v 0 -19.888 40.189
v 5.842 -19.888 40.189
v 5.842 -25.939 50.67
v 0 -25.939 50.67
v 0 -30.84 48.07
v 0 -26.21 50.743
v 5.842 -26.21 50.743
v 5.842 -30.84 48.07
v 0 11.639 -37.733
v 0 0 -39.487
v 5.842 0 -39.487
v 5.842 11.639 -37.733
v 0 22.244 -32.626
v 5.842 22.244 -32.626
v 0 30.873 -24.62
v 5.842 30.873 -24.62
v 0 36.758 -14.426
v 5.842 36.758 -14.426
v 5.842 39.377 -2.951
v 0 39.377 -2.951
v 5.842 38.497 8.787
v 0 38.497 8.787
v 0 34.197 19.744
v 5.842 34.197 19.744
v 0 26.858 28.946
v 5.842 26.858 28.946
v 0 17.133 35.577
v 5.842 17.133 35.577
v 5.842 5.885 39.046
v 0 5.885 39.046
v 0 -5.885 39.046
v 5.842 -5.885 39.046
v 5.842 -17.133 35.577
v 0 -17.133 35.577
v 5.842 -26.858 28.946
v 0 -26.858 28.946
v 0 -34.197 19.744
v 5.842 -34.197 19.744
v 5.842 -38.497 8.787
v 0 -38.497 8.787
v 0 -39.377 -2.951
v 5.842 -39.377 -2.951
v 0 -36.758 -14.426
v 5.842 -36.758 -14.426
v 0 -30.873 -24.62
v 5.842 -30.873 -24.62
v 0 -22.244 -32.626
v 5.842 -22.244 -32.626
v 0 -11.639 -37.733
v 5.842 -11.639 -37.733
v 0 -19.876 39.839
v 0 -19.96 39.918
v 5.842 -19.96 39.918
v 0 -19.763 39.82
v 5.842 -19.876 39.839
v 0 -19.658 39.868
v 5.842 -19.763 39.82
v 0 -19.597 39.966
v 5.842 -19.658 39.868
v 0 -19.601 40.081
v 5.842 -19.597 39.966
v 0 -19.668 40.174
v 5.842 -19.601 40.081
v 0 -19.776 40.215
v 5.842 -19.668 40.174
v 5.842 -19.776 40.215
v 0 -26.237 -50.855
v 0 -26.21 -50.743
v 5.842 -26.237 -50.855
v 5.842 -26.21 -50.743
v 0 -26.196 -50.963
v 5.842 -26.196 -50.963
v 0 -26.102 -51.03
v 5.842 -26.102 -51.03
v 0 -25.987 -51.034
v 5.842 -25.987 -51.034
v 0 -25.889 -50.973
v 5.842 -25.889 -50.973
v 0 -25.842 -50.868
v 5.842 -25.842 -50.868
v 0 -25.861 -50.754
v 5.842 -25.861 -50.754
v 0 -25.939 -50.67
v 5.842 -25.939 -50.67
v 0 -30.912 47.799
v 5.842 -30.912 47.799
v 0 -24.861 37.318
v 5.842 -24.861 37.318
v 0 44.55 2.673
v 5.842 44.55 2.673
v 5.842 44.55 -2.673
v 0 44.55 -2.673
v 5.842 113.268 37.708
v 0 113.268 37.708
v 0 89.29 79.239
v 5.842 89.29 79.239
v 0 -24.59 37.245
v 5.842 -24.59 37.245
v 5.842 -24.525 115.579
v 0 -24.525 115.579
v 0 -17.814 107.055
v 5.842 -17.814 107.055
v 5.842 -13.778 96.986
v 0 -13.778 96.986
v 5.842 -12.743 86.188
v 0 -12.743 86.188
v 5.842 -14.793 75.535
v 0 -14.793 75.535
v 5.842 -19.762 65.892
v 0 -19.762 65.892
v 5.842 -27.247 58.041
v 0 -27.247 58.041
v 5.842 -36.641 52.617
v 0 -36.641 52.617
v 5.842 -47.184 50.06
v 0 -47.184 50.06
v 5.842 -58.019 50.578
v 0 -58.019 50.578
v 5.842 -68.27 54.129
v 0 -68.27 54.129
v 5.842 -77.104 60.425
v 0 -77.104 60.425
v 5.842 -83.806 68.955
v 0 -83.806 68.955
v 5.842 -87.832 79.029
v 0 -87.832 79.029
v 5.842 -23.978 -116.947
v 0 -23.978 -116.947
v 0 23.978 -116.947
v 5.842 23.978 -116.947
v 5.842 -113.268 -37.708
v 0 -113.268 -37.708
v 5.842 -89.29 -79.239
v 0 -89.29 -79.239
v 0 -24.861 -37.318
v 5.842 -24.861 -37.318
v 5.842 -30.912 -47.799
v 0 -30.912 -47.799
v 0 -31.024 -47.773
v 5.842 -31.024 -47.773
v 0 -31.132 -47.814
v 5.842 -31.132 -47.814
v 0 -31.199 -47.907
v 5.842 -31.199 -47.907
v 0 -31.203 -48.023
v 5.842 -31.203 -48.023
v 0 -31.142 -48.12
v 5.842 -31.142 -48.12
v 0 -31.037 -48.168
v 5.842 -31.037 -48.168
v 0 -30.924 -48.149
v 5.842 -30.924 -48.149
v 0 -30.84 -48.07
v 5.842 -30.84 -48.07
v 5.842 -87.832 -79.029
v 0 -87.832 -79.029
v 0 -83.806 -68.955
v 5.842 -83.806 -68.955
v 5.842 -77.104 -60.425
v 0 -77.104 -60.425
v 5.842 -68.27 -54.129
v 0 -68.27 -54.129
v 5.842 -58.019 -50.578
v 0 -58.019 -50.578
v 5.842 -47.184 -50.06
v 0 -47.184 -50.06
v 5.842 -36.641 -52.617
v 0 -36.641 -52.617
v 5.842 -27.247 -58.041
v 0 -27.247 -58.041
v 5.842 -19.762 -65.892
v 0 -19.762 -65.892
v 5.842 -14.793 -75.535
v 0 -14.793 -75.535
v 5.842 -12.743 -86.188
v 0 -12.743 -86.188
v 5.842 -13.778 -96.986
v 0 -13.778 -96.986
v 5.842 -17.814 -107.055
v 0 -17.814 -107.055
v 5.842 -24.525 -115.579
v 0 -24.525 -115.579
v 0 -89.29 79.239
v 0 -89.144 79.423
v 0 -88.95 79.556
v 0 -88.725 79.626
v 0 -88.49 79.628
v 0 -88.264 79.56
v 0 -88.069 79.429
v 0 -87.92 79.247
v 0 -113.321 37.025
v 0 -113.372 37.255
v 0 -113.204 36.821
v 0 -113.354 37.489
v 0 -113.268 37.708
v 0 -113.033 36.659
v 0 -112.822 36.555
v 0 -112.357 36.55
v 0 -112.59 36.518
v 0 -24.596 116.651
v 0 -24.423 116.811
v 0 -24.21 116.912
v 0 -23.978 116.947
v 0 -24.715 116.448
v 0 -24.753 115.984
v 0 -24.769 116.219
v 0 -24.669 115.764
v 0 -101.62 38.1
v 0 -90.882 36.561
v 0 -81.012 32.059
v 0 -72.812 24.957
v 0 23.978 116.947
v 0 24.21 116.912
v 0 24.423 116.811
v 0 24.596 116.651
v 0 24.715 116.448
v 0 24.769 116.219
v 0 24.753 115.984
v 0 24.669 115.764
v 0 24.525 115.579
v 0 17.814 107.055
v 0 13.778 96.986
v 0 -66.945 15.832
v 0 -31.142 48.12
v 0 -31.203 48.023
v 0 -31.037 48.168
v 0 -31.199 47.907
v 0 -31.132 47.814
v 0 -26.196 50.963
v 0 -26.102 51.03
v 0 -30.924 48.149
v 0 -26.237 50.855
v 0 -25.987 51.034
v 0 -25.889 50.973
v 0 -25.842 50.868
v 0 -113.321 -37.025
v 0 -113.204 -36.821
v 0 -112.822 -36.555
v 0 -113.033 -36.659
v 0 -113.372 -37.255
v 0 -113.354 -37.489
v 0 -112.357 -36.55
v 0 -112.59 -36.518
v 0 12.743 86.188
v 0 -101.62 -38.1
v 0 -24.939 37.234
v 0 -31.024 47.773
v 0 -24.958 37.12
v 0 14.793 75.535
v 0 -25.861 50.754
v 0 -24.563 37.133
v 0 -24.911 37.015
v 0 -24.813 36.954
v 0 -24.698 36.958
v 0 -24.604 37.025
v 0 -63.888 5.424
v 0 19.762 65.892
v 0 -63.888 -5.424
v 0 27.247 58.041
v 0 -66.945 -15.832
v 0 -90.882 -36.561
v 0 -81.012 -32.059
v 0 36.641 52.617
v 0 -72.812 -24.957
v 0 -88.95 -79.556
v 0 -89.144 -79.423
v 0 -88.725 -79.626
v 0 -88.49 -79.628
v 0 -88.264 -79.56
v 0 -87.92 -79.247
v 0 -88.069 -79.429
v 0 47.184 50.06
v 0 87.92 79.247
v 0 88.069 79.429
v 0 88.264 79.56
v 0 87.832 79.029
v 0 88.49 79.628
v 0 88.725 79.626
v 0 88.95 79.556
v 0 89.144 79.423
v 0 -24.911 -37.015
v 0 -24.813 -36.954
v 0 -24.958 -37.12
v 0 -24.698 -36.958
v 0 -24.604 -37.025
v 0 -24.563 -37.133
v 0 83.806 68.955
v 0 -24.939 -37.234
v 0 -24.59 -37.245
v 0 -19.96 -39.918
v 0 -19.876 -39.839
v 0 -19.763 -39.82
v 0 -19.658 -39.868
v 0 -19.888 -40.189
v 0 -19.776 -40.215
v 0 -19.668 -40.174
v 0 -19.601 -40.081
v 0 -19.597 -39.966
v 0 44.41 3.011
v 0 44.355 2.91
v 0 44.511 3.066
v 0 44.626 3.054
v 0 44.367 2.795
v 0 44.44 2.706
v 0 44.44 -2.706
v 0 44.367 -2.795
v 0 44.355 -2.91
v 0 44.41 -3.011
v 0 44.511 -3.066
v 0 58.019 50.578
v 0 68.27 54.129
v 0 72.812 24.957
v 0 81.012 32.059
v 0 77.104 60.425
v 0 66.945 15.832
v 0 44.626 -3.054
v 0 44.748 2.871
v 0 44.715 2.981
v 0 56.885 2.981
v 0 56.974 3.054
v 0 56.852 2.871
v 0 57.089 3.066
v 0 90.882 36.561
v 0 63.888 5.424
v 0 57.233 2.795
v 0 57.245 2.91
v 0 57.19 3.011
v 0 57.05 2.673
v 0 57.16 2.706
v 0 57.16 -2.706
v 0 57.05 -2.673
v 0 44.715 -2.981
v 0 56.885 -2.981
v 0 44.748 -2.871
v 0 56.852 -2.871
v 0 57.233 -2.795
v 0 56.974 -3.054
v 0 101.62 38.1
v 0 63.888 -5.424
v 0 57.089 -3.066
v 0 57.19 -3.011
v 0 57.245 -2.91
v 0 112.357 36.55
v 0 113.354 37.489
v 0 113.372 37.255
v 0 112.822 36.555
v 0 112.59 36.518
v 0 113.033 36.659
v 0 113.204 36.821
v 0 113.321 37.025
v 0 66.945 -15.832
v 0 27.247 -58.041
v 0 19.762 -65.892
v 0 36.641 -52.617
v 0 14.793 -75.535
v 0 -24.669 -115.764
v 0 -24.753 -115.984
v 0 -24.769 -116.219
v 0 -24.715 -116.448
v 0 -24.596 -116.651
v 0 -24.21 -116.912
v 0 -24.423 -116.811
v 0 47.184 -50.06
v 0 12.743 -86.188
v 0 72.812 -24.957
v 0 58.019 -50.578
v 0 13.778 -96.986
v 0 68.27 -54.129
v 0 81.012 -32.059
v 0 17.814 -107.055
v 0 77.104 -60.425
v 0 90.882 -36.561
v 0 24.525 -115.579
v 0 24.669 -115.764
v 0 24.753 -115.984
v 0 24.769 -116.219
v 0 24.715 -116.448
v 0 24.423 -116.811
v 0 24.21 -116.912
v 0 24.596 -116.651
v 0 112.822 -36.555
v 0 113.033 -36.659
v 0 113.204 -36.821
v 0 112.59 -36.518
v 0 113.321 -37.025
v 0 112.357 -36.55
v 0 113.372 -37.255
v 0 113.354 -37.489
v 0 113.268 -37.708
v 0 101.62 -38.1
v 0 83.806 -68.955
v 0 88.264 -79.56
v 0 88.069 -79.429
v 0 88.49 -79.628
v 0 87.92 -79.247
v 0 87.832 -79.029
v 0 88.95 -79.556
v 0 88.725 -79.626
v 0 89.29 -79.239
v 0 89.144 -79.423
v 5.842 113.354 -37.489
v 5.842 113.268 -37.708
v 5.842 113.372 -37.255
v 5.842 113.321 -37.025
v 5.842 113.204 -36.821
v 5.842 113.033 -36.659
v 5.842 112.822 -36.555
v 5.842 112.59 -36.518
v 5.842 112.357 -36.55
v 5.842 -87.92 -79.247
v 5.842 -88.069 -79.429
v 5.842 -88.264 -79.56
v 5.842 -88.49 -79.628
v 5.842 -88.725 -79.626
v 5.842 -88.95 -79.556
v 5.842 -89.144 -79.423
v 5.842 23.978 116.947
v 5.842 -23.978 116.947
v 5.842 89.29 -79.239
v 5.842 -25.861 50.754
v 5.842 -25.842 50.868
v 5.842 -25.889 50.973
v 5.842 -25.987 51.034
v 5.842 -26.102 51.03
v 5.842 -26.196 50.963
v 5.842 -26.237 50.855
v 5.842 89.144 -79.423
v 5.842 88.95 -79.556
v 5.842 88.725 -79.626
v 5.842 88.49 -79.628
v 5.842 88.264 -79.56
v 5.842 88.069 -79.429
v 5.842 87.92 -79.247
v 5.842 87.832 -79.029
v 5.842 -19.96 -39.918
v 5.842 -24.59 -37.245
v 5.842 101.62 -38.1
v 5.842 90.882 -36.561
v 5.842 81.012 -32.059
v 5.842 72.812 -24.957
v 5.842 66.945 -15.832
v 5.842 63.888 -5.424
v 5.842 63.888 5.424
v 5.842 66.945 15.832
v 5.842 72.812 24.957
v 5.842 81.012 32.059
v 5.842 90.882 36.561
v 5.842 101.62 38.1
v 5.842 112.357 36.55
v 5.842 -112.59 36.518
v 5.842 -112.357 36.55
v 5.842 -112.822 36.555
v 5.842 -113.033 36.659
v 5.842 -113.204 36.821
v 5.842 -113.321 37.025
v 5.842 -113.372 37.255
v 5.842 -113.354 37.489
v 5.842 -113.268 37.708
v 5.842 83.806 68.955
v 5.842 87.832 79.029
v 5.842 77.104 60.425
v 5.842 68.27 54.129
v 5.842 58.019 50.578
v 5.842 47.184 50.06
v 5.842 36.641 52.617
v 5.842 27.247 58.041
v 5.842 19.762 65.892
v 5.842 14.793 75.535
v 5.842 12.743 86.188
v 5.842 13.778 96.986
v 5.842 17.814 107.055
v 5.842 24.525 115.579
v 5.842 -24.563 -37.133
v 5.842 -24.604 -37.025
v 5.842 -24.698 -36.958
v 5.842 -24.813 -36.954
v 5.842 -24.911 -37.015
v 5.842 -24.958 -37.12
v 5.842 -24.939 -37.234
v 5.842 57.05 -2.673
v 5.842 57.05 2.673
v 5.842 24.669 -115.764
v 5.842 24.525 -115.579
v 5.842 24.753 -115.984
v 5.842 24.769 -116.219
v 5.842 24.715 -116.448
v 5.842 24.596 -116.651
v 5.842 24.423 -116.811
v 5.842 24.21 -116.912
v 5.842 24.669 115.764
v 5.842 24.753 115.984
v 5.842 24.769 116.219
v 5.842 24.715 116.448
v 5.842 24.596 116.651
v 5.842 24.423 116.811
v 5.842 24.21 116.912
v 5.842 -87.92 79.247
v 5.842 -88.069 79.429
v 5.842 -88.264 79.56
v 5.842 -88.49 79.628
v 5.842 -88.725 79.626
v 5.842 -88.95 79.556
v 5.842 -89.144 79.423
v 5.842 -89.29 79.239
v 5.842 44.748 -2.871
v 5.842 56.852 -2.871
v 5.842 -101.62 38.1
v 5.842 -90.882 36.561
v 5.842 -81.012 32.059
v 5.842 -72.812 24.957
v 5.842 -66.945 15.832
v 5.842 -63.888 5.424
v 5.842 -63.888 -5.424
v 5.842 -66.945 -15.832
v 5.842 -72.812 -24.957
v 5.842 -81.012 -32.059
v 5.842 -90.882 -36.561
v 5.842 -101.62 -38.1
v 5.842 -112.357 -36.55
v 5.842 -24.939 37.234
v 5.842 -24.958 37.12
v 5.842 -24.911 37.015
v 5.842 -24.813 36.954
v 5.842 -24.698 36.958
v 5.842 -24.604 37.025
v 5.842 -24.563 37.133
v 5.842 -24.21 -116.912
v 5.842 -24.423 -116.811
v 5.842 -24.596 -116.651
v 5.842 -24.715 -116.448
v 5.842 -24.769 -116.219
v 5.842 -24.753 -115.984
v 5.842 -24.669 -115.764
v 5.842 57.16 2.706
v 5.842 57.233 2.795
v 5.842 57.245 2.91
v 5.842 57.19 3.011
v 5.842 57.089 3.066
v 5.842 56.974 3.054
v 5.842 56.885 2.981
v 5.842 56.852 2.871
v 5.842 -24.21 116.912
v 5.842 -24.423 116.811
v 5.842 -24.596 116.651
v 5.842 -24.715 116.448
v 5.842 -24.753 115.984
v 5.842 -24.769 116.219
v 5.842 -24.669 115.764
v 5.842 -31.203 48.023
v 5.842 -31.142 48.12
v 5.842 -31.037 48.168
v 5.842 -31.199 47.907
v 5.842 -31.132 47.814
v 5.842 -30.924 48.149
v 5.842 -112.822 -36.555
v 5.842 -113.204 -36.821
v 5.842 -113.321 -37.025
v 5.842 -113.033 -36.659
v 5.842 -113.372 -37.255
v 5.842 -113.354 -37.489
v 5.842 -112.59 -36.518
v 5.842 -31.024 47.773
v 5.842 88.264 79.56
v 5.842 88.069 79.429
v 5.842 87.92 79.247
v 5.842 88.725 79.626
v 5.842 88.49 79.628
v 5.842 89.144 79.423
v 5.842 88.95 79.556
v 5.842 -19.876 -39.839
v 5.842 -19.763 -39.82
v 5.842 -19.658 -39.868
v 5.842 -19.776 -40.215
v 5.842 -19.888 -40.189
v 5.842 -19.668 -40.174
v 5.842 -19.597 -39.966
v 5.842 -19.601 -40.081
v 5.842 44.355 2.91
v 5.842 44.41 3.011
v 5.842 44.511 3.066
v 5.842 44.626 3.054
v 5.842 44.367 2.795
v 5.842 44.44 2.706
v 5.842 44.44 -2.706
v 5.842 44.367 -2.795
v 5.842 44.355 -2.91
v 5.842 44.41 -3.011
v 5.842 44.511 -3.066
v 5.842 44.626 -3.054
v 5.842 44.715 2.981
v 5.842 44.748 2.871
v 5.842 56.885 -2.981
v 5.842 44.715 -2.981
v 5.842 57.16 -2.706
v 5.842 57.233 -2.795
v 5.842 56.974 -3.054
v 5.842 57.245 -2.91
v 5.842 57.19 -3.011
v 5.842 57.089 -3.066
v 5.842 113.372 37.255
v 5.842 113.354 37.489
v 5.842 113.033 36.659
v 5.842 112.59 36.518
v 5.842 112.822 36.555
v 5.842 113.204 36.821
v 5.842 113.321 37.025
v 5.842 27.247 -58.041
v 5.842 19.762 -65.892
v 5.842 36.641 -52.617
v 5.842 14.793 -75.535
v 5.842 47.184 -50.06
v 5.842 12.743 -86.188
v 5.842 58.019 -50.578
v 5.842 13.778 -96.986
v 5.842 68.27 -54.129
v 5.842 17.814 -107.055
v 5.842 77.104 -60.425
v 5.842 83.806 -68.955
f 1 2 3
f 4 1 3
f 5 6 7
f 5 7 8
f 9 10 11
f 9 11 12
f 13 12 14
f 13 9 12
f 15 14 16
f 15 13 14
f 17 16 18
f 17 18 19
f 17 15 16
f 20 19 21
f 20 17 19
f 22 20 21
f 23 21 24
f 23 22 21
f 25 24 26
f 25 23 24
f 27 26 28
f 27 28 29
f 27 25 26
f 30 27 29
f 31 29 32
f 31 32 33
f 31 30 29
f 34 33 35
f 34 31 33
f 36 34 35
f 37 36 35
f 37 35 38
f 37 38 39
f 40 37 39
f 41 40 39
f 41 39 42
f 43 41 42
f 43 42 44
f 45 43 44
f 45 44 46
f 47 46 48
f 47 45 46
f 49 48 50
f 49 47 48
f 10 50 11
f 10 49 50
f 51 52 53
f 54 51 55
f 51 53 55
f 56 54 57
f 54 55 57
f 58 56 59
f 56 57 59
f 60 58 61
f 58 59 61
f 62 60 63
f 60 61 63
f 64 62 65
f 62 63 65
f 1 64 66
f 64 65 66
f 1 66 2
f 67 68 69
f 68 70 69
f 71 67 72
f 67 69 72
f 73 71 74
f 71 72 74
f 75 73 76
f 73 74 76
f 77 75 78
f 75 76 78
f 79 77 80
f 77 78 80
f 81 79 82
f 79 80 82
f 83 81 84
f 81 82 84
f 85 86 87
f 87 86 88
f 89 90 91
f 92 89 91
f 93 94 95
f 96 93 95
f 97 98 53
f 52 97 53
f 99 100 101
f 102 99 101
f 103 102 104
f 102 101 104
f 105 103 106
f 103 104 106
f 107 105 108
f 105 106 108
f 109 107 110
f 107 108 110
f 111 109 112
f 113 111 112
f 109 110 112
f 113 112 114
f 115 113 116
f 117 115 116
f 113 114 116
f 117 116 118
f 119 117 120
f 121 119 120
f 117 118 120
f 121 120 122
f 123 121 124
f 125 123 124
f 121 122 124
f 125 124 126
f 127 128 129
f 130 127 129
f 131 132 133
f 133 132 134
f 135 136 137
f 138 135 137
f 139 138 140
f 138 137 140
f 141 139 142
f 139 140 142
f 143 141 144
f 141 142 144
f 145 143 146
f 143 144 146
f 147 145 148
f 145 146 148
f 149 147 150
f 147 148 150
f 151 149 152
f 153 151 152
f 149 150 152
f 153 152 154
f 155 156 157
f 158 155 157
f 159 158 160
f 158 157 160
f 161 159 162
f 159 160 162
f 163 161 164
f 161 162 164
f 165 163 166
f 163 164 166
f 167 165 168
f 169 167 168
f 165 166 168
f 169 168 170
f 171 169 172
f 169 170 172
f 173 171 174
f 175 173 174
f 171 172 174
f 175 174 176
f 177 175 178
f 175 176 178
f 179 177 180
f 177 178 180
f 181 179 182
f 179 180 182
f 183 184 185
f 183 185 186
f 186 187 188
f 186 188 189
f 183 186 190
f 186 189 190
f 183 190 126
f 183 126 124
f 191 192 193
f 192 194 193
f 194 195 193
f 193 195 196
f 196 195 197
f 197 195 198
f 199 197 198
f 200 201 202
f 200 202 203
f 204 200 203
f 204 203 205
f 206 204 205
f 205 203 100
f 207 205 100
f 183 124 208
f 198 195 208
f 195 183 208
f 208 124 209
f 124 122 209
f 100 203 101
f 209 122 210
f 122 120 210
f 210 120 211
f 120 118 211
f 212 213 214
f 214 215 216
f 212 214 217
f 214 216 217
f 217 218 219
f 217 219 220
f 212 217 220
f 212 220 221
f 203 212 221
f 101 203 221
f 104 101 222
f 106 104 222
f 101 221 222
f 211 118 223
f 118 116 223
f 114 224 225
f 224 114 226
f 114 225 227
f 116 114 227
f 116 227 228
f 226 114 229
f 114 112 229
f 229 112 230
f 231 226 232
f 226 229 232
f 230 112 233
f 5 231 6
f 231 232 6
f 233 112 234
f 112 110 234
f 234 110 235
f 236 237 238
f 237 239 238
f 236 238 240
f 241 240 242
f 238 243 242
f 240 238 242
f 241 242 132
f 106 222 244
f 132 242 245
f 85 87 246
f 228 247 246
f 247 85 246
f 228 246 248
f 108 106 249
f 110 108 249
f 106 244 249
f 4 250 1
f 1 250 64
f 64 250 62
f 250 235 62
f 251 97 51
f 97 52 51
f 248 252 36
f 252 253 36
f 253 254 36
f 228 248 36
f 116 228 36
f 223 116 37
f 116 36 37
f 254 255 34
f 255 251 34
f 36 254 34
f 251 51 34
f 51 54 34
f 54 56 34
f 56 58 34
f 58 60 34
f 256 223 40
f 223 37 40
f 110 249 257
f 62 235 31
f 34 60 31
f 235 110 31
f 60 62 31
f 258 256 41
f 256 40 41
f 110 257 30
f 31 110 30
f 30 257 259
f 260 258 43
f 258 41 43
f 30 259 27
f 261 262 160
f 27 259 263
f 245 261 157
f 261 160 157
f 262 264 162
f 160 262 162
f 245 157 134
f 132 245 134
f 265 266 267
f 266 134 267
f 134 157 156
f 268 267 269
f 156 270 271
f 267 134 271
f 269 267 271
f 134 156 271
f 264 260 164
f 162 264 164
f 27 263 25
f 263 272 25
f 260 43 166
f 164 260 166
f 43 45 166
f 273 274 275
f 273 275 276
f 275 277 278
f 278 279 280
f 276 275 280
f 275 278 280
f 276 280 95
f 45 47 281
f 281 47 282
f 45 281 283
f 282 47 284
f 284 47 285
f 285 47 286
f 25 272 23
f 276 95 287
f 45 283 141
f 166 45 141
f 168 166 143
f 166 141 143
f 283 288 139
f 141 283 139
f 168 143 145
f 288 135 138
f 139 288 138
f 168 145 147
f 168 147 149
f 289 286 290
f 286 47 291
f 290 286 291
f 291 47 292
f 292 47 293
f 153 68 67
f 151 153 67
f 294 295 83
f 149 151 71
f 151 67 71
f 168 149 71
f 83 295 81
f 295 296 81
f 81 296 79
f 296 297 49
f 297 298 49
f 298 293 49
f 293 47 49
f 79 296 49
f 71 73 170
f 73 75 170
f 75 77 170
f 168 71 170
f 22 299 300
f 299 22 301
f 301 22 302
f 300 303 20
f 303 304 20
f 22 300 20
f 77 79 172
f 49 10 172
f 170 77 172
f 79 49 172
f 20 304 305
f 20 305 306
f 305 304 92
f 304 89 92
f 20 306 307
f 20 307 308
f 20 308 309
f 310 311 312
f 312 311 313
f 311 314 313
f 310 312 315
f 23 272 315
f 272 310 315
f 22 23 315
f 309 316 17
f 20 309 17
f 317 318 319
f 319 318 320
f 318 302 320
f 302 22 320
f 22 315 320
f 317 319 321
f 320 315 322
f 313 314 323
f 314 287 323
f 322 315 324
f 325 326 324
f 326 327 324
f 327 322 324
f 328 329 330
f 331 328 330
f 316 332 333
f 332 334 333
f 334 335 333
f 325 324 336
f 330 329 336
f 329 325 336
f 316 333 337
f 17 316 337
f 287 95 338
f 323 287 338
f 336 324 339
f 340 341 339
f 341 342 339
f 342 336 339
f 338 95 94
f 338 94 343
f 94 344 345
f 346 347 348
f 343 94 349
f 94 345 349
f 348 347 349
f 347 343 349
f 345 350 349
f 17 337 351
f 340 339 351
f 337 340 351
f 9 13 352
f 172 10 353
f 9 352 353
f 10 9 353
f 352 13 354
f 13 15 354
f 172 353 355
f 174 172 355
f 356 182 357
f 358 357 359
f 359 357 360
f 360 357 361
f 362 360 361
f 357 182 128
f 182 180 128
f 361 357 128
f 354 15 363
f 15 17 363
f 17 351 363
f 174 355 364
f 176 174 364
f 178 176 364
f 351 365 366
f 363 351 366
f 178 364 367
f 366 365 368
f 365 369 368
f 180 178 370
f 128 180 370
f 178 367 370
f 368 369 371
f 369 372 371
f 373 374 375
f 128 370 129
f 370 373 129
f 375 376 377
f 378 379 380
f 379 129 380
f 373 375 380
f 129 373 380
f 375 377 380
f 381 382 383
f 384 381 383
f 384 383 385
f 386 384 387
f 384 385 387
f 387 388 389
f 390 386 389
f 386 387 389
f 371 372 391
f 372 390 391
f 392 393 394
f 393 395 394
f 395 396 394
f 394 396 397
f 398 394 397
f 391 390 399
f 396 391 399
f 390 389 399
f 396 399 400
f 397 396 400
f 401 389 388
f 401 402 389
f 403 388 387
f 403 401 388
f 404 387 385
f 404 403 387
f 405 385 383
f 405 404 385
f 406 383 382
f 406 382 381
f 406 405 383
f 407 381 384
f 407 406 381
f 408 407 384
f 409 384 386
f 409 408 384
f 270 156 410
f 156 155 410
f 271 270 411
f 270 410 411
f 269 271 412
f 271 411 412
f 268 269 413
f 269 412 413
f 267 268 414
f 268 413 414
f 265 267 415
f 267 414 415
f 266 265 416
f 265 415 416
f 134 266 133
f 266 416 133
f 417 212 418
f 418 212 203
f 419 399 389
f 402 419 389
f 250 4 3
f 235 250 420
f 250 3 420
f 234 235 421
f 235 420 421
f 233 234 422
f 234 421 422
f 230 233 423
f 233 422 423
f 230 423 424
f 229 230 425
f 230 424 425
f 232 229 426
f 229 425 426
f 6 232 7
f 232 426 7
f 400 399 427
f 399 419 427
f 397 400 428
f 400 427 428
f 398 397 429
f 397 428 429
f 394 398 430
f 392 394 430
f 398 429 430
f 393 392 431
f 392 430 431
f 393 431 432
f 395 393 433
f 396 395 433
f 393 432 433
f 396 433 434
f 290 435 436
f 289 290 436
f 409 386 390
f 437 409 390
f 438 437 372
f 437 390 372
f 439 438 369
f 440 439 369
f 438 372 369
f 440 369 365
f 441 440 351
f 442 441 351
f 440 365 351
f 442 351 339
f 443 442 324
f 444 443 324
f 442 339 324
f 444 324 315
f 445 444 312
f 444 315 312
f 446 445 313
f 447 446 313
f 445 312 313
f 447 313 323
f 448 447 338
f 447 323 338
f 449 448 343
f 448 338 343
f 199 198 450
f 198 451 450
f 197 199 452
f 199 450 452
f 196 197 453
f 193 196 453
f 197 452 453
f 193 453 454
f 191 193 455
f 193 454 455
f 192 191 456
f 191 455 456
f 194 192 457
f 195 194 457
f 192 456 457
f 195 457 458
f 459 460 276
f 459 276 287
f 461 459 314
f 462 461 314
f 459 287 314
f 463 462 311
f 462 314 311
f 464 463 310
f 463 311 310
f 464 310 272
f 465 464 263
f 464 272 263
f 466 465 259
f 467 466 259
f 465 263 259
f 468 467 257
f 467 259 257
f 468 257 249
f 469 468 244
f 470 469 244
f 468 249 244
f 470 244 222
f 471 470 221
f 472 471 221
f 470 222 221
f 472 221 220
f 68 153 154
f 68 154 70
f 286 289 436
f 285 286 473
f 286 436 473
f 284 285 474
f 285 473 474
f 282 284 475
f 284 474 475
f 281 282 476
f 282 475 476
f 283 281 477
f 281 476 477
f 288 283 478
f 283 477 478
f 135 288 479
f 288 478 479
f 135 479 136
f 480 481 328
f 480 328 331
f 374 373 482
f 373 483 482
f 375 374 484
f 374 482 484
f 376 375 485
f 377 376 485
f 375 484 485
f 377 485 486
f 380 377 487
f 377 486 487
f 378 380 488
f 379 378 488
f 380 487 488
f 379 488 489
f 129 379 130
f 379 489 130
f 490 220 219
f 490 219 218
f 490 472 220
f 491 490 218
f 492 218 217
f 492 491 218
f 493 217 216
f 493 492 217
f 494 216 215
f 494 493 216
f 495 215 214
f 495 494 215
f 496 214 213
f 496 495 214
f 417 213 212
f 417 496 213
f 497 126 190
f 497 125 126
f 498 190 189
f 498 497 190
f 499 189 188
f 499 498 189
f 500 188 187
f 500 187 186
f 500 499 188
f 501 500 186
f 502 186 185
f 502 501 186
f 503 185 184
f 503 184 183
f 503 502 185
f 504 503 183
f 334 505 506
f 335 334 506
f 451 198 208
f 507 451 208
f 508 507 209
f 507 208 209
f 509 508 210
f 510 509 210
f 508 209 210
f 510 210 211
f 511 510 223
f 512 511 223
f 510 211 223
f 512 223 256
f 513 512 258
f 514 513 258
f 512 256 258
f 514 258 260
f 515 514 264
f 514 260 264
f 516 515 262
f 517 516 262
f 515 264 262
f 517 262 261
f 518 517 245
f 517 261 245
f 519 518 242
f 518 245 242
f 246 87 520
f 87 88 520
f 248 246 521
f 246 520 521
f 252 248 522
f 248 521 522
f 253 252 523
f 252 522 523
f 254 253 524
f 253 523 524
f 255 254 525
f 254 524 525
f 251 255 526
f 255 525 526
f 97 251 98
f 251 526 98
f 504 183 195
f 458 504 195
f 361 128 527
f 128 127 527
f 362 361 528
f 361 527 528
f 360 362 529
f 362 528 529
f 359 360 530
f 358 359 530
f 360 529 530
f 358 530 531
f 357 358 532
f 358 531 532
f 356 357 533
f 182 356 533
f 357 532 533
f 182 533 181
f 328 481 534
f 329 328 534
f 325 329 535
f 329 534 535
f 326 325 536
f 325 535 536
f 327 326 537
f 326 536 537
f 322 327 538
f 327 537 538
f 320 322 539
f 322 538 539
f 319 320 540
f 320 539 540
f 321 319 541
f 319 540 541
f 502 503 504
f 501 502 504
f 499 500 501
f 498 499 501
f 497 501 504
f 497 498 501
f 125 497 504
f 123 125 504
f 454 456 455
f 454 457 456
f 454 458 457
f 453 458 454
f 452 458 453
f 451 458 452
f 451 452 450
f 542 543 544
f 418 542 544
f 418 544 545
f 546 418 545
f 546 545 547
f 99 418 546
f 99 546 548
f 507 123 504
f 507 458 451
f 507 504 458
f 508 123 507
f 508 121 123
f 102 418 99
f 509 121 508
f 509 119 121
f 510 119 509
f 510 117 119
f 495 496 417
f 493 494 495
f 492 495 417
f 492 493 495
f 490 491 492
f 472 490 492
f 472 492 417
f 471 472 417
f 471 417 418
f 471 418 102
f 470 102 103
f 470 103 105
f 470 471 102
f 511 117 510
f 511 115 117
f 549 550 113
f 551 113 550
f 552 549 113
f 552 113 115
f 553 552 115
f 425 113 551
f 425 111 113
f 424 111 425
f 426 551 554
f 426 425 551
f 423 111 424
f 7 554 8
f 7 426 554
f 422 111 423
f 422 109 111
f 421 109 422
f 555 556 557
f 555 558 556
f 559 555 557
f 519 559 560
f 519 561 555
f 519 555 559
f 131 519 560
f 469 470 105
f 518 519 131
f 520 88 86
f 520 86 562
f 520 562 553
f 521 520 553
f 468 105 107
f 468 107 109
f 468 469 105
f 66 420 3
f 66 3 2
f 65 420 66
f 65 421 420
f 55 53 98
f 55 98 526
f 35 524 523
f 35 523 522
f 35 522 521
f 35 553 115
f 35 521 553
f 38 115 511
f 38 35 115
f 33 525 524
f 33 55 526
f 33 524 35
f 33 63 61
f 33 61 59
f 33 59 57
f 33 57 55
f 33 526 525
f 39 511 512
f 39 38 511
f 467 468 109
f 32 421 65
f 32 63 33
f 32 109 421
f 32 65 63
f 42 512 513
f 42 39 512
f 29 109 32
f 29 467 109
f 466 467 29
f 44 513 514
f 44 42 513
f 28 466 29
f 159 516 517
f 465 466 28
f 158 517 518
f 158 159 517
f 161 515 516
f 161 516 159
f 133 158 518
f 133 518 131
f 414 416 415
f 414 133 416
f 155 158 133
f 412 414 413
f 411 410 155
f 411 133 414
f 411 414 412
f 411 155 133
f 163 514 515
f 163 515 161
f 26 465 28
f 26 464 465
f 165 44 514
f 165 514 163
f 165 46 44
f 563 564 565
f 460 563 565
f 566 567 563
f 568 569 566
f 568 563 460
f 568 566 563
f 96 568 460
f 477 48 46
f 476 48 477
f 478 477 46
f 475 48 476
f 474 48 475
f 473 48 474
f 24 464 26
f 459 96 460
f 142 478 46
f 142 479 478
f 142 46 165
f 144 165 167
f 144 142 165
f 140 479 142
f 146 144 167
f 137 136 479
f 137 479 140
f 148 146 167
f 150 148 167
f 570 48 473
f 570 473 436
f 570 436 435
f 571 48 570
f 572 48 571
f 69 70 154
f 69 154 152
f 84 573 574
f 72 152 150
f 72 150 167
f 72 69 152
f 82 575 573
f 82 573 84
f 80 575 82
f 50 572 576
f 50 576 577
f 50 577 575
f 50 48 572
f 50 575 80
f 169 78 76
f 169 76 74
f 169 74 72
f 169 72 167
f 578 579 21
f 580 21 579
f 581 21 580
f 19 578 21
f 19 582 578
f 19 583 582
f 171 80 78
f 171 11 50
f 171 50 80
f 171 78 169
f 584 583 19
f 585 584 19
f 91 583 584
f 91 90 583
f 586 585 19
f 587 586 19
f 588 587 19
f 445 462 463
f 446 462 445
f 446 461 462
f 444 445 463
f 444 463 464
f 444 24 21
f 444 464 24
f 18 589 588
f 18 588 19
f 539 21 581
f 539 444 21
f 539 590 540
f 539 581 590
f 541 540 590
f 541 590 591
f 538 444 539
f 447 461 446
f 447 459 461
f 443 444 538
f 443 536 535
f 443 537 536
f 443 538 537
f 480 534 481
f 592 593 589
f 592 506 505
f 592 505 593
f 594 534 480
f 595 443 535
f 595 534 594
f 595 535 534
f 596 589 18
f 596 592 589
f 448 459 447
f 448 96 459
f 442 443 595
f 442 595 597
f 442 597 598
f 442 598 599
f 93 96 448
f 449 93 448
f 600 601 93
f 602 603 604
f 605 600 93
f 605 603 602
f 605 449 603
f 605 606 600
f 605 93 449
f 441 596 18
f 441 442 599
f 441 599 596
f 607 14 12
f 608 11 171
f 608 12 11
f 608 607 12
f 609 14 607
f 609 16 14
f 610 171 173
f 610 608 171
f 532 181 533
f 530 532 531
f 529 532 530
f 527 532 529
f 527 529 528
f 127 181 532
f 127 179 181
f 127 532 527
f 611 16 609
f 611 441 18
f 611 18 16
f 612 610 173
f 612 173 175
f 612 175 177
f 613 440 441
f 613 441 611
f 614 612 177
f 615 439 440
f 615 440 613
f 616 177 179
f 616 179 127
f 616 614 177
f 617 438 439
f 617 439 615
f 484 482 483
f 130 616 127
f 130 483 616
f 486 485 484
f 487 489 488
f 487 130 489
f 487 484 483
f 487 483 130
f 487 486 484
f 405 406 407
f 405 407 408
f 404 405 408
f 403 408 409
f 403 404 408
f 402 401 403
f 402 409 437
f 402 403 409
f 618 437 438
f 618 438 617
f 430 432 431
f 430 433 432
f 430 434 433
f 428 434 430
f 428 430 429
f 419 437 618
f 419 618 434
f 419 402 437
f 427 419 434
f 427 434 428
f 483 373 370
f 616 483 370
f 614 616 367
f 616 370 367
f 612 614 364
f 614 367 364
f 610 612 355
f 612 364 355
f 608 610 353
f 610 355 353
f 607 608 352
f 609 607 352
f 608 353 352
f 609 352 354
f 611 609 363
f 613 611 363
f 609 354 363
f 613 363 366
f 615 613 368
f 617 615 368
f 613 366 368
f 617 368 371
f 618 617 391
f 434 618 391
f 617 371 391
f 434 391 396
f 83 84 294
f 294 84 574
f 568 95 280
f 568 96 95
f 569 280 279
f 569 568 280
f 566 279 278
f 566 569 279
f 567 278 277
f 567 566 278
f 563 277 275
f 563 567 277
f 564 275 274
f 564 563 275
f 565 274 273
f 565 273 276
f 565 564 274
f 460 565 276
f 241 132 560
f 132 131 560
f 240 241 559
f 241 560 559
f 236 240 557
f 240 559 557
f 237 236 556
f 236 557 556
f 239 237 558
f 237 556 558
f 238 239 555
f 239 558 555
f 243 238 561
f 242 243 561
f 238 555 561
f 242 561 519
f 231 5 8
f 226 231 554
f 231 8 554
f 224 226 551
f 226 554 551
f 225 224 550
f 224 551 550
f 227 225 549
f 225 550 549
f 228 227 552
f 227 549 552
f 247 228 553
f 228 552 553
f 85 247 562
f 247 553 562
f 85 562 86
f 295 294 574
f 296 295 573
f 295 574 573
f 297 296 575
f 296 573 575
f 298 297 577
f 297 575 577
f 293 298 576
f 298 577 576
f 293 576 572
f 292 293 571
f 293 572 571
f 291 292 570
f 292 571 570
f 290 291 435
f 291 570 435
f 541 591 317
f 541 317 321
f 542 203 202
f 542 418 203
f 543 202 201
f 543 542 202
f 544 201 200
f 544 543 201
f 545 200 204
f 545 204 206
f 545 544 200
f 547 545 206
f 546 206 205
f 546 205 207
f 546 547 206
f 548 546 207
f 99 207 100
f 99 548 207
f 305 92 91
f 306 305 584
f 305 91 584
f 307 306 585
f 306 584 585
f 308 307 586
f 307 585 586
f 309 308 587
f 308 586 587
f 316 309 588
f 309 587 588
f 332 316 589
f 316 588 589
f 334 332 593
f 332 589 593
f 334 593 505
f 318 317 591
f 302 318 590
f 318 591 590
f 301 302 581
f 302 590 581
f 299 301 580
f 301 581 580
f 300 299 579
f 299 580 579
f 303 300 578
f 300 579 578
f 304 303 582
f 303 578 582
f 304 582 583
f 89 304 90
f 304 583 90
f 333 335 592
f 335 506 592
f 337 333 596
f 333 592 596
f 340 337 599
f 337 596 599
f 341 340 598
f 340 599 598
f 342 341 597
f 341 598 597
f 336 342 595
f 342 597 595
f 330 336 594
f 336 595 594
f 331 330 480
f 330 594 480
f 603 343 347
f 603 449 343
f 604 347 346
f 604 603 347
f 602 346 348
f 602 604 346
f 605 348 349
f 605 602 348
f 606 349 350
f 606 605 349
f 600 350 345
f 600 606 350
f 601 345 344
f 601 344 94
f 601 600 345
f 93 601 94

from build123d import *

# Parameters (mm, degrees)
SKETCH2_R           = 39.487475
BOSS_EXTRUDE1_DEPTH = 5.842
FILLET1_R           = 0.79375
SKETCH4_W           = 5.742
SKETCH4_H           = 12.5
CUT_EXTRUDE3_DEPTH  = 163.986308211
SKETCH5_R           = 0.1984375
CUT_EXTRUDE4_DEPTH  = 163.986308211


with BuildPart() as part:
    # Sketch2 → Boss-Extrude1 (new body)
    with BuildSketch(Plane(origin=(0, 0, 0), x_dir=(0, 0, -1), z_dir=(1, 0, 0))):
        with BuildLine():
            Line((81.02619141, 88.258519733), (35.921024484, 114.3))
            ThreePointArc((35.921024484, 114.3), (0, 63.5), (-35.921024484, 114.3))
            Line((-35.921024484, 114.3), (-81.02619141, 88.258519733))
            ThreePointArc((-81.02619141, 88.258519733), (-54.99261314, 31.75), (-116.947215895, 26.041480267))
            Line((-116.947215895, 26.041480267), (-116.947215895, -26.041480267))
            ThreePointArc((-116.947215895, -26.041480267), (-54.99261314, -31.75), (-81.02619141, -88.258519733))
            Line((-81.02619141, -88.258519733), (-35.921024484, -114.3))
            ThreePointArc((-35.921024484, -114.3), (0, -63.5), (35.921024484, -114.3))
            Line((35.921024484, -114.3), (81.02619141, -88.258519733))
            ThreePointArc((81.02619141, -88.258519733), (54.99261314, -31.75), (116.947215895, -26.041480267))
            Line((116.947215895, -26.041480267), (116.947215895, 26.041480267))
            ThreePointArc((116.947215895, 26.041480267), (54.99261314, 31.75), (81.02619141, 88.258519733))
        make_face()
        Circle(SKETCH2_R, mode=Mode.SUBTRACT)
    extrude(amount=BOSS_EXTRUDE1_DEPTH)

    # Fillet1
    fillet1_edges = [part.edges().sort_by_distance(p)[0] for p in [
        (2.921, 88.258519733, 81.02619141),
        (2.921, 114.3, 35.921024484),
        (2.921, 114.3, -35.921024484),
        (2.921, 88.258519733, -81.02619141),
        (2.921, 26.041480267, -116.947215895),
        (2.921, -26.041480267, -116.947215895),
        (2.921, -88.258519733, -81.02619141),
        (2.921, -114.3, -35.921024484),
        (2.921, -114.3, 35.921024484),
        (2.921, -88.258519733, 81.02619141),
        (2.921, -26.041480267, 116.947215895),
        (2.921, 26.041480267, 116.947215895),
    ]]
    fillet(fillet1_edges, radius=FILLET1_R)

    # Sketch4 → Cut-Extrude3 (cut, through all)
    with BuildSketch(Plane(origin=(5.842, 0, 0), x_dir=(0, 0, -1), z_dir=(1, 0, 0))):
        Polygon((47.971249286, -31.011358934), (50.842249286, -26.038641066), (40.016931739, -19.788641066), (37.145931739, -24.761358934), align=None)
        with Locations((0, 50.8)):
            Rectangle(SKETCH4_W, SKETCH4_H)
        Polygon((-50.842249286, -26.038641066), (-47.971249286, -31.011358934), (-37.145931739, -24.761358934), (-40.016931739, -19.788641066), align=None)
    extrude(amount=-CUT_EXTRUDE3_DEPTH, mode=Mode.SUBTRACT)

    # Sketch5 → Cut-Extrude4 (cut, through all)
    with BuildSketch(Plane(origin=(5.842, 0, 0), x_dir=(0, 0, -1), z_dir=(1, 0, 0))):
        with Locations((2.871, 57.05)):
            Circle(SKETCH5_R)
        with Locations((-2.871, 57.05)):
            Circle(SKETCH5_R)
        with Locations((-2.871, 44.55)):
            Circle(SKETCH5_R)
        with Locations((2.871, 44.55)):
            Circle(SKETCH5_R)
        with Locations((47.971249286, -31.011358934)):
            Circle(SKETCH5_R)
        with Locations((50.842249286, -26.038641066)):
            Circle(SKETCH5_R)
        with Locations((40.016931739, -19.788641066)):
            Circle(SKETCH5_R)
        with Locations((37.145931739, -24.761358934)):
            Circle(SKETCH5_R)
        with Locations((-50.842249286, -26.038641066)):
            Circle(SKETCH5_R)
        with Locations((-47.971249286, -31.011358934)):
            Circle(SKETCH5_R)
        with Locations((-37.145931739, -24.761358934)):
            Circle(SKETCH5_R)
        with Locations((-40.016931739, -19.788641066)):
            Circle(SKETCH5_R)
    extrude(amount=-CUT_EXTRUDE4_DEPTH, mode=Mode.SUBTRACT)


solid = part.part
